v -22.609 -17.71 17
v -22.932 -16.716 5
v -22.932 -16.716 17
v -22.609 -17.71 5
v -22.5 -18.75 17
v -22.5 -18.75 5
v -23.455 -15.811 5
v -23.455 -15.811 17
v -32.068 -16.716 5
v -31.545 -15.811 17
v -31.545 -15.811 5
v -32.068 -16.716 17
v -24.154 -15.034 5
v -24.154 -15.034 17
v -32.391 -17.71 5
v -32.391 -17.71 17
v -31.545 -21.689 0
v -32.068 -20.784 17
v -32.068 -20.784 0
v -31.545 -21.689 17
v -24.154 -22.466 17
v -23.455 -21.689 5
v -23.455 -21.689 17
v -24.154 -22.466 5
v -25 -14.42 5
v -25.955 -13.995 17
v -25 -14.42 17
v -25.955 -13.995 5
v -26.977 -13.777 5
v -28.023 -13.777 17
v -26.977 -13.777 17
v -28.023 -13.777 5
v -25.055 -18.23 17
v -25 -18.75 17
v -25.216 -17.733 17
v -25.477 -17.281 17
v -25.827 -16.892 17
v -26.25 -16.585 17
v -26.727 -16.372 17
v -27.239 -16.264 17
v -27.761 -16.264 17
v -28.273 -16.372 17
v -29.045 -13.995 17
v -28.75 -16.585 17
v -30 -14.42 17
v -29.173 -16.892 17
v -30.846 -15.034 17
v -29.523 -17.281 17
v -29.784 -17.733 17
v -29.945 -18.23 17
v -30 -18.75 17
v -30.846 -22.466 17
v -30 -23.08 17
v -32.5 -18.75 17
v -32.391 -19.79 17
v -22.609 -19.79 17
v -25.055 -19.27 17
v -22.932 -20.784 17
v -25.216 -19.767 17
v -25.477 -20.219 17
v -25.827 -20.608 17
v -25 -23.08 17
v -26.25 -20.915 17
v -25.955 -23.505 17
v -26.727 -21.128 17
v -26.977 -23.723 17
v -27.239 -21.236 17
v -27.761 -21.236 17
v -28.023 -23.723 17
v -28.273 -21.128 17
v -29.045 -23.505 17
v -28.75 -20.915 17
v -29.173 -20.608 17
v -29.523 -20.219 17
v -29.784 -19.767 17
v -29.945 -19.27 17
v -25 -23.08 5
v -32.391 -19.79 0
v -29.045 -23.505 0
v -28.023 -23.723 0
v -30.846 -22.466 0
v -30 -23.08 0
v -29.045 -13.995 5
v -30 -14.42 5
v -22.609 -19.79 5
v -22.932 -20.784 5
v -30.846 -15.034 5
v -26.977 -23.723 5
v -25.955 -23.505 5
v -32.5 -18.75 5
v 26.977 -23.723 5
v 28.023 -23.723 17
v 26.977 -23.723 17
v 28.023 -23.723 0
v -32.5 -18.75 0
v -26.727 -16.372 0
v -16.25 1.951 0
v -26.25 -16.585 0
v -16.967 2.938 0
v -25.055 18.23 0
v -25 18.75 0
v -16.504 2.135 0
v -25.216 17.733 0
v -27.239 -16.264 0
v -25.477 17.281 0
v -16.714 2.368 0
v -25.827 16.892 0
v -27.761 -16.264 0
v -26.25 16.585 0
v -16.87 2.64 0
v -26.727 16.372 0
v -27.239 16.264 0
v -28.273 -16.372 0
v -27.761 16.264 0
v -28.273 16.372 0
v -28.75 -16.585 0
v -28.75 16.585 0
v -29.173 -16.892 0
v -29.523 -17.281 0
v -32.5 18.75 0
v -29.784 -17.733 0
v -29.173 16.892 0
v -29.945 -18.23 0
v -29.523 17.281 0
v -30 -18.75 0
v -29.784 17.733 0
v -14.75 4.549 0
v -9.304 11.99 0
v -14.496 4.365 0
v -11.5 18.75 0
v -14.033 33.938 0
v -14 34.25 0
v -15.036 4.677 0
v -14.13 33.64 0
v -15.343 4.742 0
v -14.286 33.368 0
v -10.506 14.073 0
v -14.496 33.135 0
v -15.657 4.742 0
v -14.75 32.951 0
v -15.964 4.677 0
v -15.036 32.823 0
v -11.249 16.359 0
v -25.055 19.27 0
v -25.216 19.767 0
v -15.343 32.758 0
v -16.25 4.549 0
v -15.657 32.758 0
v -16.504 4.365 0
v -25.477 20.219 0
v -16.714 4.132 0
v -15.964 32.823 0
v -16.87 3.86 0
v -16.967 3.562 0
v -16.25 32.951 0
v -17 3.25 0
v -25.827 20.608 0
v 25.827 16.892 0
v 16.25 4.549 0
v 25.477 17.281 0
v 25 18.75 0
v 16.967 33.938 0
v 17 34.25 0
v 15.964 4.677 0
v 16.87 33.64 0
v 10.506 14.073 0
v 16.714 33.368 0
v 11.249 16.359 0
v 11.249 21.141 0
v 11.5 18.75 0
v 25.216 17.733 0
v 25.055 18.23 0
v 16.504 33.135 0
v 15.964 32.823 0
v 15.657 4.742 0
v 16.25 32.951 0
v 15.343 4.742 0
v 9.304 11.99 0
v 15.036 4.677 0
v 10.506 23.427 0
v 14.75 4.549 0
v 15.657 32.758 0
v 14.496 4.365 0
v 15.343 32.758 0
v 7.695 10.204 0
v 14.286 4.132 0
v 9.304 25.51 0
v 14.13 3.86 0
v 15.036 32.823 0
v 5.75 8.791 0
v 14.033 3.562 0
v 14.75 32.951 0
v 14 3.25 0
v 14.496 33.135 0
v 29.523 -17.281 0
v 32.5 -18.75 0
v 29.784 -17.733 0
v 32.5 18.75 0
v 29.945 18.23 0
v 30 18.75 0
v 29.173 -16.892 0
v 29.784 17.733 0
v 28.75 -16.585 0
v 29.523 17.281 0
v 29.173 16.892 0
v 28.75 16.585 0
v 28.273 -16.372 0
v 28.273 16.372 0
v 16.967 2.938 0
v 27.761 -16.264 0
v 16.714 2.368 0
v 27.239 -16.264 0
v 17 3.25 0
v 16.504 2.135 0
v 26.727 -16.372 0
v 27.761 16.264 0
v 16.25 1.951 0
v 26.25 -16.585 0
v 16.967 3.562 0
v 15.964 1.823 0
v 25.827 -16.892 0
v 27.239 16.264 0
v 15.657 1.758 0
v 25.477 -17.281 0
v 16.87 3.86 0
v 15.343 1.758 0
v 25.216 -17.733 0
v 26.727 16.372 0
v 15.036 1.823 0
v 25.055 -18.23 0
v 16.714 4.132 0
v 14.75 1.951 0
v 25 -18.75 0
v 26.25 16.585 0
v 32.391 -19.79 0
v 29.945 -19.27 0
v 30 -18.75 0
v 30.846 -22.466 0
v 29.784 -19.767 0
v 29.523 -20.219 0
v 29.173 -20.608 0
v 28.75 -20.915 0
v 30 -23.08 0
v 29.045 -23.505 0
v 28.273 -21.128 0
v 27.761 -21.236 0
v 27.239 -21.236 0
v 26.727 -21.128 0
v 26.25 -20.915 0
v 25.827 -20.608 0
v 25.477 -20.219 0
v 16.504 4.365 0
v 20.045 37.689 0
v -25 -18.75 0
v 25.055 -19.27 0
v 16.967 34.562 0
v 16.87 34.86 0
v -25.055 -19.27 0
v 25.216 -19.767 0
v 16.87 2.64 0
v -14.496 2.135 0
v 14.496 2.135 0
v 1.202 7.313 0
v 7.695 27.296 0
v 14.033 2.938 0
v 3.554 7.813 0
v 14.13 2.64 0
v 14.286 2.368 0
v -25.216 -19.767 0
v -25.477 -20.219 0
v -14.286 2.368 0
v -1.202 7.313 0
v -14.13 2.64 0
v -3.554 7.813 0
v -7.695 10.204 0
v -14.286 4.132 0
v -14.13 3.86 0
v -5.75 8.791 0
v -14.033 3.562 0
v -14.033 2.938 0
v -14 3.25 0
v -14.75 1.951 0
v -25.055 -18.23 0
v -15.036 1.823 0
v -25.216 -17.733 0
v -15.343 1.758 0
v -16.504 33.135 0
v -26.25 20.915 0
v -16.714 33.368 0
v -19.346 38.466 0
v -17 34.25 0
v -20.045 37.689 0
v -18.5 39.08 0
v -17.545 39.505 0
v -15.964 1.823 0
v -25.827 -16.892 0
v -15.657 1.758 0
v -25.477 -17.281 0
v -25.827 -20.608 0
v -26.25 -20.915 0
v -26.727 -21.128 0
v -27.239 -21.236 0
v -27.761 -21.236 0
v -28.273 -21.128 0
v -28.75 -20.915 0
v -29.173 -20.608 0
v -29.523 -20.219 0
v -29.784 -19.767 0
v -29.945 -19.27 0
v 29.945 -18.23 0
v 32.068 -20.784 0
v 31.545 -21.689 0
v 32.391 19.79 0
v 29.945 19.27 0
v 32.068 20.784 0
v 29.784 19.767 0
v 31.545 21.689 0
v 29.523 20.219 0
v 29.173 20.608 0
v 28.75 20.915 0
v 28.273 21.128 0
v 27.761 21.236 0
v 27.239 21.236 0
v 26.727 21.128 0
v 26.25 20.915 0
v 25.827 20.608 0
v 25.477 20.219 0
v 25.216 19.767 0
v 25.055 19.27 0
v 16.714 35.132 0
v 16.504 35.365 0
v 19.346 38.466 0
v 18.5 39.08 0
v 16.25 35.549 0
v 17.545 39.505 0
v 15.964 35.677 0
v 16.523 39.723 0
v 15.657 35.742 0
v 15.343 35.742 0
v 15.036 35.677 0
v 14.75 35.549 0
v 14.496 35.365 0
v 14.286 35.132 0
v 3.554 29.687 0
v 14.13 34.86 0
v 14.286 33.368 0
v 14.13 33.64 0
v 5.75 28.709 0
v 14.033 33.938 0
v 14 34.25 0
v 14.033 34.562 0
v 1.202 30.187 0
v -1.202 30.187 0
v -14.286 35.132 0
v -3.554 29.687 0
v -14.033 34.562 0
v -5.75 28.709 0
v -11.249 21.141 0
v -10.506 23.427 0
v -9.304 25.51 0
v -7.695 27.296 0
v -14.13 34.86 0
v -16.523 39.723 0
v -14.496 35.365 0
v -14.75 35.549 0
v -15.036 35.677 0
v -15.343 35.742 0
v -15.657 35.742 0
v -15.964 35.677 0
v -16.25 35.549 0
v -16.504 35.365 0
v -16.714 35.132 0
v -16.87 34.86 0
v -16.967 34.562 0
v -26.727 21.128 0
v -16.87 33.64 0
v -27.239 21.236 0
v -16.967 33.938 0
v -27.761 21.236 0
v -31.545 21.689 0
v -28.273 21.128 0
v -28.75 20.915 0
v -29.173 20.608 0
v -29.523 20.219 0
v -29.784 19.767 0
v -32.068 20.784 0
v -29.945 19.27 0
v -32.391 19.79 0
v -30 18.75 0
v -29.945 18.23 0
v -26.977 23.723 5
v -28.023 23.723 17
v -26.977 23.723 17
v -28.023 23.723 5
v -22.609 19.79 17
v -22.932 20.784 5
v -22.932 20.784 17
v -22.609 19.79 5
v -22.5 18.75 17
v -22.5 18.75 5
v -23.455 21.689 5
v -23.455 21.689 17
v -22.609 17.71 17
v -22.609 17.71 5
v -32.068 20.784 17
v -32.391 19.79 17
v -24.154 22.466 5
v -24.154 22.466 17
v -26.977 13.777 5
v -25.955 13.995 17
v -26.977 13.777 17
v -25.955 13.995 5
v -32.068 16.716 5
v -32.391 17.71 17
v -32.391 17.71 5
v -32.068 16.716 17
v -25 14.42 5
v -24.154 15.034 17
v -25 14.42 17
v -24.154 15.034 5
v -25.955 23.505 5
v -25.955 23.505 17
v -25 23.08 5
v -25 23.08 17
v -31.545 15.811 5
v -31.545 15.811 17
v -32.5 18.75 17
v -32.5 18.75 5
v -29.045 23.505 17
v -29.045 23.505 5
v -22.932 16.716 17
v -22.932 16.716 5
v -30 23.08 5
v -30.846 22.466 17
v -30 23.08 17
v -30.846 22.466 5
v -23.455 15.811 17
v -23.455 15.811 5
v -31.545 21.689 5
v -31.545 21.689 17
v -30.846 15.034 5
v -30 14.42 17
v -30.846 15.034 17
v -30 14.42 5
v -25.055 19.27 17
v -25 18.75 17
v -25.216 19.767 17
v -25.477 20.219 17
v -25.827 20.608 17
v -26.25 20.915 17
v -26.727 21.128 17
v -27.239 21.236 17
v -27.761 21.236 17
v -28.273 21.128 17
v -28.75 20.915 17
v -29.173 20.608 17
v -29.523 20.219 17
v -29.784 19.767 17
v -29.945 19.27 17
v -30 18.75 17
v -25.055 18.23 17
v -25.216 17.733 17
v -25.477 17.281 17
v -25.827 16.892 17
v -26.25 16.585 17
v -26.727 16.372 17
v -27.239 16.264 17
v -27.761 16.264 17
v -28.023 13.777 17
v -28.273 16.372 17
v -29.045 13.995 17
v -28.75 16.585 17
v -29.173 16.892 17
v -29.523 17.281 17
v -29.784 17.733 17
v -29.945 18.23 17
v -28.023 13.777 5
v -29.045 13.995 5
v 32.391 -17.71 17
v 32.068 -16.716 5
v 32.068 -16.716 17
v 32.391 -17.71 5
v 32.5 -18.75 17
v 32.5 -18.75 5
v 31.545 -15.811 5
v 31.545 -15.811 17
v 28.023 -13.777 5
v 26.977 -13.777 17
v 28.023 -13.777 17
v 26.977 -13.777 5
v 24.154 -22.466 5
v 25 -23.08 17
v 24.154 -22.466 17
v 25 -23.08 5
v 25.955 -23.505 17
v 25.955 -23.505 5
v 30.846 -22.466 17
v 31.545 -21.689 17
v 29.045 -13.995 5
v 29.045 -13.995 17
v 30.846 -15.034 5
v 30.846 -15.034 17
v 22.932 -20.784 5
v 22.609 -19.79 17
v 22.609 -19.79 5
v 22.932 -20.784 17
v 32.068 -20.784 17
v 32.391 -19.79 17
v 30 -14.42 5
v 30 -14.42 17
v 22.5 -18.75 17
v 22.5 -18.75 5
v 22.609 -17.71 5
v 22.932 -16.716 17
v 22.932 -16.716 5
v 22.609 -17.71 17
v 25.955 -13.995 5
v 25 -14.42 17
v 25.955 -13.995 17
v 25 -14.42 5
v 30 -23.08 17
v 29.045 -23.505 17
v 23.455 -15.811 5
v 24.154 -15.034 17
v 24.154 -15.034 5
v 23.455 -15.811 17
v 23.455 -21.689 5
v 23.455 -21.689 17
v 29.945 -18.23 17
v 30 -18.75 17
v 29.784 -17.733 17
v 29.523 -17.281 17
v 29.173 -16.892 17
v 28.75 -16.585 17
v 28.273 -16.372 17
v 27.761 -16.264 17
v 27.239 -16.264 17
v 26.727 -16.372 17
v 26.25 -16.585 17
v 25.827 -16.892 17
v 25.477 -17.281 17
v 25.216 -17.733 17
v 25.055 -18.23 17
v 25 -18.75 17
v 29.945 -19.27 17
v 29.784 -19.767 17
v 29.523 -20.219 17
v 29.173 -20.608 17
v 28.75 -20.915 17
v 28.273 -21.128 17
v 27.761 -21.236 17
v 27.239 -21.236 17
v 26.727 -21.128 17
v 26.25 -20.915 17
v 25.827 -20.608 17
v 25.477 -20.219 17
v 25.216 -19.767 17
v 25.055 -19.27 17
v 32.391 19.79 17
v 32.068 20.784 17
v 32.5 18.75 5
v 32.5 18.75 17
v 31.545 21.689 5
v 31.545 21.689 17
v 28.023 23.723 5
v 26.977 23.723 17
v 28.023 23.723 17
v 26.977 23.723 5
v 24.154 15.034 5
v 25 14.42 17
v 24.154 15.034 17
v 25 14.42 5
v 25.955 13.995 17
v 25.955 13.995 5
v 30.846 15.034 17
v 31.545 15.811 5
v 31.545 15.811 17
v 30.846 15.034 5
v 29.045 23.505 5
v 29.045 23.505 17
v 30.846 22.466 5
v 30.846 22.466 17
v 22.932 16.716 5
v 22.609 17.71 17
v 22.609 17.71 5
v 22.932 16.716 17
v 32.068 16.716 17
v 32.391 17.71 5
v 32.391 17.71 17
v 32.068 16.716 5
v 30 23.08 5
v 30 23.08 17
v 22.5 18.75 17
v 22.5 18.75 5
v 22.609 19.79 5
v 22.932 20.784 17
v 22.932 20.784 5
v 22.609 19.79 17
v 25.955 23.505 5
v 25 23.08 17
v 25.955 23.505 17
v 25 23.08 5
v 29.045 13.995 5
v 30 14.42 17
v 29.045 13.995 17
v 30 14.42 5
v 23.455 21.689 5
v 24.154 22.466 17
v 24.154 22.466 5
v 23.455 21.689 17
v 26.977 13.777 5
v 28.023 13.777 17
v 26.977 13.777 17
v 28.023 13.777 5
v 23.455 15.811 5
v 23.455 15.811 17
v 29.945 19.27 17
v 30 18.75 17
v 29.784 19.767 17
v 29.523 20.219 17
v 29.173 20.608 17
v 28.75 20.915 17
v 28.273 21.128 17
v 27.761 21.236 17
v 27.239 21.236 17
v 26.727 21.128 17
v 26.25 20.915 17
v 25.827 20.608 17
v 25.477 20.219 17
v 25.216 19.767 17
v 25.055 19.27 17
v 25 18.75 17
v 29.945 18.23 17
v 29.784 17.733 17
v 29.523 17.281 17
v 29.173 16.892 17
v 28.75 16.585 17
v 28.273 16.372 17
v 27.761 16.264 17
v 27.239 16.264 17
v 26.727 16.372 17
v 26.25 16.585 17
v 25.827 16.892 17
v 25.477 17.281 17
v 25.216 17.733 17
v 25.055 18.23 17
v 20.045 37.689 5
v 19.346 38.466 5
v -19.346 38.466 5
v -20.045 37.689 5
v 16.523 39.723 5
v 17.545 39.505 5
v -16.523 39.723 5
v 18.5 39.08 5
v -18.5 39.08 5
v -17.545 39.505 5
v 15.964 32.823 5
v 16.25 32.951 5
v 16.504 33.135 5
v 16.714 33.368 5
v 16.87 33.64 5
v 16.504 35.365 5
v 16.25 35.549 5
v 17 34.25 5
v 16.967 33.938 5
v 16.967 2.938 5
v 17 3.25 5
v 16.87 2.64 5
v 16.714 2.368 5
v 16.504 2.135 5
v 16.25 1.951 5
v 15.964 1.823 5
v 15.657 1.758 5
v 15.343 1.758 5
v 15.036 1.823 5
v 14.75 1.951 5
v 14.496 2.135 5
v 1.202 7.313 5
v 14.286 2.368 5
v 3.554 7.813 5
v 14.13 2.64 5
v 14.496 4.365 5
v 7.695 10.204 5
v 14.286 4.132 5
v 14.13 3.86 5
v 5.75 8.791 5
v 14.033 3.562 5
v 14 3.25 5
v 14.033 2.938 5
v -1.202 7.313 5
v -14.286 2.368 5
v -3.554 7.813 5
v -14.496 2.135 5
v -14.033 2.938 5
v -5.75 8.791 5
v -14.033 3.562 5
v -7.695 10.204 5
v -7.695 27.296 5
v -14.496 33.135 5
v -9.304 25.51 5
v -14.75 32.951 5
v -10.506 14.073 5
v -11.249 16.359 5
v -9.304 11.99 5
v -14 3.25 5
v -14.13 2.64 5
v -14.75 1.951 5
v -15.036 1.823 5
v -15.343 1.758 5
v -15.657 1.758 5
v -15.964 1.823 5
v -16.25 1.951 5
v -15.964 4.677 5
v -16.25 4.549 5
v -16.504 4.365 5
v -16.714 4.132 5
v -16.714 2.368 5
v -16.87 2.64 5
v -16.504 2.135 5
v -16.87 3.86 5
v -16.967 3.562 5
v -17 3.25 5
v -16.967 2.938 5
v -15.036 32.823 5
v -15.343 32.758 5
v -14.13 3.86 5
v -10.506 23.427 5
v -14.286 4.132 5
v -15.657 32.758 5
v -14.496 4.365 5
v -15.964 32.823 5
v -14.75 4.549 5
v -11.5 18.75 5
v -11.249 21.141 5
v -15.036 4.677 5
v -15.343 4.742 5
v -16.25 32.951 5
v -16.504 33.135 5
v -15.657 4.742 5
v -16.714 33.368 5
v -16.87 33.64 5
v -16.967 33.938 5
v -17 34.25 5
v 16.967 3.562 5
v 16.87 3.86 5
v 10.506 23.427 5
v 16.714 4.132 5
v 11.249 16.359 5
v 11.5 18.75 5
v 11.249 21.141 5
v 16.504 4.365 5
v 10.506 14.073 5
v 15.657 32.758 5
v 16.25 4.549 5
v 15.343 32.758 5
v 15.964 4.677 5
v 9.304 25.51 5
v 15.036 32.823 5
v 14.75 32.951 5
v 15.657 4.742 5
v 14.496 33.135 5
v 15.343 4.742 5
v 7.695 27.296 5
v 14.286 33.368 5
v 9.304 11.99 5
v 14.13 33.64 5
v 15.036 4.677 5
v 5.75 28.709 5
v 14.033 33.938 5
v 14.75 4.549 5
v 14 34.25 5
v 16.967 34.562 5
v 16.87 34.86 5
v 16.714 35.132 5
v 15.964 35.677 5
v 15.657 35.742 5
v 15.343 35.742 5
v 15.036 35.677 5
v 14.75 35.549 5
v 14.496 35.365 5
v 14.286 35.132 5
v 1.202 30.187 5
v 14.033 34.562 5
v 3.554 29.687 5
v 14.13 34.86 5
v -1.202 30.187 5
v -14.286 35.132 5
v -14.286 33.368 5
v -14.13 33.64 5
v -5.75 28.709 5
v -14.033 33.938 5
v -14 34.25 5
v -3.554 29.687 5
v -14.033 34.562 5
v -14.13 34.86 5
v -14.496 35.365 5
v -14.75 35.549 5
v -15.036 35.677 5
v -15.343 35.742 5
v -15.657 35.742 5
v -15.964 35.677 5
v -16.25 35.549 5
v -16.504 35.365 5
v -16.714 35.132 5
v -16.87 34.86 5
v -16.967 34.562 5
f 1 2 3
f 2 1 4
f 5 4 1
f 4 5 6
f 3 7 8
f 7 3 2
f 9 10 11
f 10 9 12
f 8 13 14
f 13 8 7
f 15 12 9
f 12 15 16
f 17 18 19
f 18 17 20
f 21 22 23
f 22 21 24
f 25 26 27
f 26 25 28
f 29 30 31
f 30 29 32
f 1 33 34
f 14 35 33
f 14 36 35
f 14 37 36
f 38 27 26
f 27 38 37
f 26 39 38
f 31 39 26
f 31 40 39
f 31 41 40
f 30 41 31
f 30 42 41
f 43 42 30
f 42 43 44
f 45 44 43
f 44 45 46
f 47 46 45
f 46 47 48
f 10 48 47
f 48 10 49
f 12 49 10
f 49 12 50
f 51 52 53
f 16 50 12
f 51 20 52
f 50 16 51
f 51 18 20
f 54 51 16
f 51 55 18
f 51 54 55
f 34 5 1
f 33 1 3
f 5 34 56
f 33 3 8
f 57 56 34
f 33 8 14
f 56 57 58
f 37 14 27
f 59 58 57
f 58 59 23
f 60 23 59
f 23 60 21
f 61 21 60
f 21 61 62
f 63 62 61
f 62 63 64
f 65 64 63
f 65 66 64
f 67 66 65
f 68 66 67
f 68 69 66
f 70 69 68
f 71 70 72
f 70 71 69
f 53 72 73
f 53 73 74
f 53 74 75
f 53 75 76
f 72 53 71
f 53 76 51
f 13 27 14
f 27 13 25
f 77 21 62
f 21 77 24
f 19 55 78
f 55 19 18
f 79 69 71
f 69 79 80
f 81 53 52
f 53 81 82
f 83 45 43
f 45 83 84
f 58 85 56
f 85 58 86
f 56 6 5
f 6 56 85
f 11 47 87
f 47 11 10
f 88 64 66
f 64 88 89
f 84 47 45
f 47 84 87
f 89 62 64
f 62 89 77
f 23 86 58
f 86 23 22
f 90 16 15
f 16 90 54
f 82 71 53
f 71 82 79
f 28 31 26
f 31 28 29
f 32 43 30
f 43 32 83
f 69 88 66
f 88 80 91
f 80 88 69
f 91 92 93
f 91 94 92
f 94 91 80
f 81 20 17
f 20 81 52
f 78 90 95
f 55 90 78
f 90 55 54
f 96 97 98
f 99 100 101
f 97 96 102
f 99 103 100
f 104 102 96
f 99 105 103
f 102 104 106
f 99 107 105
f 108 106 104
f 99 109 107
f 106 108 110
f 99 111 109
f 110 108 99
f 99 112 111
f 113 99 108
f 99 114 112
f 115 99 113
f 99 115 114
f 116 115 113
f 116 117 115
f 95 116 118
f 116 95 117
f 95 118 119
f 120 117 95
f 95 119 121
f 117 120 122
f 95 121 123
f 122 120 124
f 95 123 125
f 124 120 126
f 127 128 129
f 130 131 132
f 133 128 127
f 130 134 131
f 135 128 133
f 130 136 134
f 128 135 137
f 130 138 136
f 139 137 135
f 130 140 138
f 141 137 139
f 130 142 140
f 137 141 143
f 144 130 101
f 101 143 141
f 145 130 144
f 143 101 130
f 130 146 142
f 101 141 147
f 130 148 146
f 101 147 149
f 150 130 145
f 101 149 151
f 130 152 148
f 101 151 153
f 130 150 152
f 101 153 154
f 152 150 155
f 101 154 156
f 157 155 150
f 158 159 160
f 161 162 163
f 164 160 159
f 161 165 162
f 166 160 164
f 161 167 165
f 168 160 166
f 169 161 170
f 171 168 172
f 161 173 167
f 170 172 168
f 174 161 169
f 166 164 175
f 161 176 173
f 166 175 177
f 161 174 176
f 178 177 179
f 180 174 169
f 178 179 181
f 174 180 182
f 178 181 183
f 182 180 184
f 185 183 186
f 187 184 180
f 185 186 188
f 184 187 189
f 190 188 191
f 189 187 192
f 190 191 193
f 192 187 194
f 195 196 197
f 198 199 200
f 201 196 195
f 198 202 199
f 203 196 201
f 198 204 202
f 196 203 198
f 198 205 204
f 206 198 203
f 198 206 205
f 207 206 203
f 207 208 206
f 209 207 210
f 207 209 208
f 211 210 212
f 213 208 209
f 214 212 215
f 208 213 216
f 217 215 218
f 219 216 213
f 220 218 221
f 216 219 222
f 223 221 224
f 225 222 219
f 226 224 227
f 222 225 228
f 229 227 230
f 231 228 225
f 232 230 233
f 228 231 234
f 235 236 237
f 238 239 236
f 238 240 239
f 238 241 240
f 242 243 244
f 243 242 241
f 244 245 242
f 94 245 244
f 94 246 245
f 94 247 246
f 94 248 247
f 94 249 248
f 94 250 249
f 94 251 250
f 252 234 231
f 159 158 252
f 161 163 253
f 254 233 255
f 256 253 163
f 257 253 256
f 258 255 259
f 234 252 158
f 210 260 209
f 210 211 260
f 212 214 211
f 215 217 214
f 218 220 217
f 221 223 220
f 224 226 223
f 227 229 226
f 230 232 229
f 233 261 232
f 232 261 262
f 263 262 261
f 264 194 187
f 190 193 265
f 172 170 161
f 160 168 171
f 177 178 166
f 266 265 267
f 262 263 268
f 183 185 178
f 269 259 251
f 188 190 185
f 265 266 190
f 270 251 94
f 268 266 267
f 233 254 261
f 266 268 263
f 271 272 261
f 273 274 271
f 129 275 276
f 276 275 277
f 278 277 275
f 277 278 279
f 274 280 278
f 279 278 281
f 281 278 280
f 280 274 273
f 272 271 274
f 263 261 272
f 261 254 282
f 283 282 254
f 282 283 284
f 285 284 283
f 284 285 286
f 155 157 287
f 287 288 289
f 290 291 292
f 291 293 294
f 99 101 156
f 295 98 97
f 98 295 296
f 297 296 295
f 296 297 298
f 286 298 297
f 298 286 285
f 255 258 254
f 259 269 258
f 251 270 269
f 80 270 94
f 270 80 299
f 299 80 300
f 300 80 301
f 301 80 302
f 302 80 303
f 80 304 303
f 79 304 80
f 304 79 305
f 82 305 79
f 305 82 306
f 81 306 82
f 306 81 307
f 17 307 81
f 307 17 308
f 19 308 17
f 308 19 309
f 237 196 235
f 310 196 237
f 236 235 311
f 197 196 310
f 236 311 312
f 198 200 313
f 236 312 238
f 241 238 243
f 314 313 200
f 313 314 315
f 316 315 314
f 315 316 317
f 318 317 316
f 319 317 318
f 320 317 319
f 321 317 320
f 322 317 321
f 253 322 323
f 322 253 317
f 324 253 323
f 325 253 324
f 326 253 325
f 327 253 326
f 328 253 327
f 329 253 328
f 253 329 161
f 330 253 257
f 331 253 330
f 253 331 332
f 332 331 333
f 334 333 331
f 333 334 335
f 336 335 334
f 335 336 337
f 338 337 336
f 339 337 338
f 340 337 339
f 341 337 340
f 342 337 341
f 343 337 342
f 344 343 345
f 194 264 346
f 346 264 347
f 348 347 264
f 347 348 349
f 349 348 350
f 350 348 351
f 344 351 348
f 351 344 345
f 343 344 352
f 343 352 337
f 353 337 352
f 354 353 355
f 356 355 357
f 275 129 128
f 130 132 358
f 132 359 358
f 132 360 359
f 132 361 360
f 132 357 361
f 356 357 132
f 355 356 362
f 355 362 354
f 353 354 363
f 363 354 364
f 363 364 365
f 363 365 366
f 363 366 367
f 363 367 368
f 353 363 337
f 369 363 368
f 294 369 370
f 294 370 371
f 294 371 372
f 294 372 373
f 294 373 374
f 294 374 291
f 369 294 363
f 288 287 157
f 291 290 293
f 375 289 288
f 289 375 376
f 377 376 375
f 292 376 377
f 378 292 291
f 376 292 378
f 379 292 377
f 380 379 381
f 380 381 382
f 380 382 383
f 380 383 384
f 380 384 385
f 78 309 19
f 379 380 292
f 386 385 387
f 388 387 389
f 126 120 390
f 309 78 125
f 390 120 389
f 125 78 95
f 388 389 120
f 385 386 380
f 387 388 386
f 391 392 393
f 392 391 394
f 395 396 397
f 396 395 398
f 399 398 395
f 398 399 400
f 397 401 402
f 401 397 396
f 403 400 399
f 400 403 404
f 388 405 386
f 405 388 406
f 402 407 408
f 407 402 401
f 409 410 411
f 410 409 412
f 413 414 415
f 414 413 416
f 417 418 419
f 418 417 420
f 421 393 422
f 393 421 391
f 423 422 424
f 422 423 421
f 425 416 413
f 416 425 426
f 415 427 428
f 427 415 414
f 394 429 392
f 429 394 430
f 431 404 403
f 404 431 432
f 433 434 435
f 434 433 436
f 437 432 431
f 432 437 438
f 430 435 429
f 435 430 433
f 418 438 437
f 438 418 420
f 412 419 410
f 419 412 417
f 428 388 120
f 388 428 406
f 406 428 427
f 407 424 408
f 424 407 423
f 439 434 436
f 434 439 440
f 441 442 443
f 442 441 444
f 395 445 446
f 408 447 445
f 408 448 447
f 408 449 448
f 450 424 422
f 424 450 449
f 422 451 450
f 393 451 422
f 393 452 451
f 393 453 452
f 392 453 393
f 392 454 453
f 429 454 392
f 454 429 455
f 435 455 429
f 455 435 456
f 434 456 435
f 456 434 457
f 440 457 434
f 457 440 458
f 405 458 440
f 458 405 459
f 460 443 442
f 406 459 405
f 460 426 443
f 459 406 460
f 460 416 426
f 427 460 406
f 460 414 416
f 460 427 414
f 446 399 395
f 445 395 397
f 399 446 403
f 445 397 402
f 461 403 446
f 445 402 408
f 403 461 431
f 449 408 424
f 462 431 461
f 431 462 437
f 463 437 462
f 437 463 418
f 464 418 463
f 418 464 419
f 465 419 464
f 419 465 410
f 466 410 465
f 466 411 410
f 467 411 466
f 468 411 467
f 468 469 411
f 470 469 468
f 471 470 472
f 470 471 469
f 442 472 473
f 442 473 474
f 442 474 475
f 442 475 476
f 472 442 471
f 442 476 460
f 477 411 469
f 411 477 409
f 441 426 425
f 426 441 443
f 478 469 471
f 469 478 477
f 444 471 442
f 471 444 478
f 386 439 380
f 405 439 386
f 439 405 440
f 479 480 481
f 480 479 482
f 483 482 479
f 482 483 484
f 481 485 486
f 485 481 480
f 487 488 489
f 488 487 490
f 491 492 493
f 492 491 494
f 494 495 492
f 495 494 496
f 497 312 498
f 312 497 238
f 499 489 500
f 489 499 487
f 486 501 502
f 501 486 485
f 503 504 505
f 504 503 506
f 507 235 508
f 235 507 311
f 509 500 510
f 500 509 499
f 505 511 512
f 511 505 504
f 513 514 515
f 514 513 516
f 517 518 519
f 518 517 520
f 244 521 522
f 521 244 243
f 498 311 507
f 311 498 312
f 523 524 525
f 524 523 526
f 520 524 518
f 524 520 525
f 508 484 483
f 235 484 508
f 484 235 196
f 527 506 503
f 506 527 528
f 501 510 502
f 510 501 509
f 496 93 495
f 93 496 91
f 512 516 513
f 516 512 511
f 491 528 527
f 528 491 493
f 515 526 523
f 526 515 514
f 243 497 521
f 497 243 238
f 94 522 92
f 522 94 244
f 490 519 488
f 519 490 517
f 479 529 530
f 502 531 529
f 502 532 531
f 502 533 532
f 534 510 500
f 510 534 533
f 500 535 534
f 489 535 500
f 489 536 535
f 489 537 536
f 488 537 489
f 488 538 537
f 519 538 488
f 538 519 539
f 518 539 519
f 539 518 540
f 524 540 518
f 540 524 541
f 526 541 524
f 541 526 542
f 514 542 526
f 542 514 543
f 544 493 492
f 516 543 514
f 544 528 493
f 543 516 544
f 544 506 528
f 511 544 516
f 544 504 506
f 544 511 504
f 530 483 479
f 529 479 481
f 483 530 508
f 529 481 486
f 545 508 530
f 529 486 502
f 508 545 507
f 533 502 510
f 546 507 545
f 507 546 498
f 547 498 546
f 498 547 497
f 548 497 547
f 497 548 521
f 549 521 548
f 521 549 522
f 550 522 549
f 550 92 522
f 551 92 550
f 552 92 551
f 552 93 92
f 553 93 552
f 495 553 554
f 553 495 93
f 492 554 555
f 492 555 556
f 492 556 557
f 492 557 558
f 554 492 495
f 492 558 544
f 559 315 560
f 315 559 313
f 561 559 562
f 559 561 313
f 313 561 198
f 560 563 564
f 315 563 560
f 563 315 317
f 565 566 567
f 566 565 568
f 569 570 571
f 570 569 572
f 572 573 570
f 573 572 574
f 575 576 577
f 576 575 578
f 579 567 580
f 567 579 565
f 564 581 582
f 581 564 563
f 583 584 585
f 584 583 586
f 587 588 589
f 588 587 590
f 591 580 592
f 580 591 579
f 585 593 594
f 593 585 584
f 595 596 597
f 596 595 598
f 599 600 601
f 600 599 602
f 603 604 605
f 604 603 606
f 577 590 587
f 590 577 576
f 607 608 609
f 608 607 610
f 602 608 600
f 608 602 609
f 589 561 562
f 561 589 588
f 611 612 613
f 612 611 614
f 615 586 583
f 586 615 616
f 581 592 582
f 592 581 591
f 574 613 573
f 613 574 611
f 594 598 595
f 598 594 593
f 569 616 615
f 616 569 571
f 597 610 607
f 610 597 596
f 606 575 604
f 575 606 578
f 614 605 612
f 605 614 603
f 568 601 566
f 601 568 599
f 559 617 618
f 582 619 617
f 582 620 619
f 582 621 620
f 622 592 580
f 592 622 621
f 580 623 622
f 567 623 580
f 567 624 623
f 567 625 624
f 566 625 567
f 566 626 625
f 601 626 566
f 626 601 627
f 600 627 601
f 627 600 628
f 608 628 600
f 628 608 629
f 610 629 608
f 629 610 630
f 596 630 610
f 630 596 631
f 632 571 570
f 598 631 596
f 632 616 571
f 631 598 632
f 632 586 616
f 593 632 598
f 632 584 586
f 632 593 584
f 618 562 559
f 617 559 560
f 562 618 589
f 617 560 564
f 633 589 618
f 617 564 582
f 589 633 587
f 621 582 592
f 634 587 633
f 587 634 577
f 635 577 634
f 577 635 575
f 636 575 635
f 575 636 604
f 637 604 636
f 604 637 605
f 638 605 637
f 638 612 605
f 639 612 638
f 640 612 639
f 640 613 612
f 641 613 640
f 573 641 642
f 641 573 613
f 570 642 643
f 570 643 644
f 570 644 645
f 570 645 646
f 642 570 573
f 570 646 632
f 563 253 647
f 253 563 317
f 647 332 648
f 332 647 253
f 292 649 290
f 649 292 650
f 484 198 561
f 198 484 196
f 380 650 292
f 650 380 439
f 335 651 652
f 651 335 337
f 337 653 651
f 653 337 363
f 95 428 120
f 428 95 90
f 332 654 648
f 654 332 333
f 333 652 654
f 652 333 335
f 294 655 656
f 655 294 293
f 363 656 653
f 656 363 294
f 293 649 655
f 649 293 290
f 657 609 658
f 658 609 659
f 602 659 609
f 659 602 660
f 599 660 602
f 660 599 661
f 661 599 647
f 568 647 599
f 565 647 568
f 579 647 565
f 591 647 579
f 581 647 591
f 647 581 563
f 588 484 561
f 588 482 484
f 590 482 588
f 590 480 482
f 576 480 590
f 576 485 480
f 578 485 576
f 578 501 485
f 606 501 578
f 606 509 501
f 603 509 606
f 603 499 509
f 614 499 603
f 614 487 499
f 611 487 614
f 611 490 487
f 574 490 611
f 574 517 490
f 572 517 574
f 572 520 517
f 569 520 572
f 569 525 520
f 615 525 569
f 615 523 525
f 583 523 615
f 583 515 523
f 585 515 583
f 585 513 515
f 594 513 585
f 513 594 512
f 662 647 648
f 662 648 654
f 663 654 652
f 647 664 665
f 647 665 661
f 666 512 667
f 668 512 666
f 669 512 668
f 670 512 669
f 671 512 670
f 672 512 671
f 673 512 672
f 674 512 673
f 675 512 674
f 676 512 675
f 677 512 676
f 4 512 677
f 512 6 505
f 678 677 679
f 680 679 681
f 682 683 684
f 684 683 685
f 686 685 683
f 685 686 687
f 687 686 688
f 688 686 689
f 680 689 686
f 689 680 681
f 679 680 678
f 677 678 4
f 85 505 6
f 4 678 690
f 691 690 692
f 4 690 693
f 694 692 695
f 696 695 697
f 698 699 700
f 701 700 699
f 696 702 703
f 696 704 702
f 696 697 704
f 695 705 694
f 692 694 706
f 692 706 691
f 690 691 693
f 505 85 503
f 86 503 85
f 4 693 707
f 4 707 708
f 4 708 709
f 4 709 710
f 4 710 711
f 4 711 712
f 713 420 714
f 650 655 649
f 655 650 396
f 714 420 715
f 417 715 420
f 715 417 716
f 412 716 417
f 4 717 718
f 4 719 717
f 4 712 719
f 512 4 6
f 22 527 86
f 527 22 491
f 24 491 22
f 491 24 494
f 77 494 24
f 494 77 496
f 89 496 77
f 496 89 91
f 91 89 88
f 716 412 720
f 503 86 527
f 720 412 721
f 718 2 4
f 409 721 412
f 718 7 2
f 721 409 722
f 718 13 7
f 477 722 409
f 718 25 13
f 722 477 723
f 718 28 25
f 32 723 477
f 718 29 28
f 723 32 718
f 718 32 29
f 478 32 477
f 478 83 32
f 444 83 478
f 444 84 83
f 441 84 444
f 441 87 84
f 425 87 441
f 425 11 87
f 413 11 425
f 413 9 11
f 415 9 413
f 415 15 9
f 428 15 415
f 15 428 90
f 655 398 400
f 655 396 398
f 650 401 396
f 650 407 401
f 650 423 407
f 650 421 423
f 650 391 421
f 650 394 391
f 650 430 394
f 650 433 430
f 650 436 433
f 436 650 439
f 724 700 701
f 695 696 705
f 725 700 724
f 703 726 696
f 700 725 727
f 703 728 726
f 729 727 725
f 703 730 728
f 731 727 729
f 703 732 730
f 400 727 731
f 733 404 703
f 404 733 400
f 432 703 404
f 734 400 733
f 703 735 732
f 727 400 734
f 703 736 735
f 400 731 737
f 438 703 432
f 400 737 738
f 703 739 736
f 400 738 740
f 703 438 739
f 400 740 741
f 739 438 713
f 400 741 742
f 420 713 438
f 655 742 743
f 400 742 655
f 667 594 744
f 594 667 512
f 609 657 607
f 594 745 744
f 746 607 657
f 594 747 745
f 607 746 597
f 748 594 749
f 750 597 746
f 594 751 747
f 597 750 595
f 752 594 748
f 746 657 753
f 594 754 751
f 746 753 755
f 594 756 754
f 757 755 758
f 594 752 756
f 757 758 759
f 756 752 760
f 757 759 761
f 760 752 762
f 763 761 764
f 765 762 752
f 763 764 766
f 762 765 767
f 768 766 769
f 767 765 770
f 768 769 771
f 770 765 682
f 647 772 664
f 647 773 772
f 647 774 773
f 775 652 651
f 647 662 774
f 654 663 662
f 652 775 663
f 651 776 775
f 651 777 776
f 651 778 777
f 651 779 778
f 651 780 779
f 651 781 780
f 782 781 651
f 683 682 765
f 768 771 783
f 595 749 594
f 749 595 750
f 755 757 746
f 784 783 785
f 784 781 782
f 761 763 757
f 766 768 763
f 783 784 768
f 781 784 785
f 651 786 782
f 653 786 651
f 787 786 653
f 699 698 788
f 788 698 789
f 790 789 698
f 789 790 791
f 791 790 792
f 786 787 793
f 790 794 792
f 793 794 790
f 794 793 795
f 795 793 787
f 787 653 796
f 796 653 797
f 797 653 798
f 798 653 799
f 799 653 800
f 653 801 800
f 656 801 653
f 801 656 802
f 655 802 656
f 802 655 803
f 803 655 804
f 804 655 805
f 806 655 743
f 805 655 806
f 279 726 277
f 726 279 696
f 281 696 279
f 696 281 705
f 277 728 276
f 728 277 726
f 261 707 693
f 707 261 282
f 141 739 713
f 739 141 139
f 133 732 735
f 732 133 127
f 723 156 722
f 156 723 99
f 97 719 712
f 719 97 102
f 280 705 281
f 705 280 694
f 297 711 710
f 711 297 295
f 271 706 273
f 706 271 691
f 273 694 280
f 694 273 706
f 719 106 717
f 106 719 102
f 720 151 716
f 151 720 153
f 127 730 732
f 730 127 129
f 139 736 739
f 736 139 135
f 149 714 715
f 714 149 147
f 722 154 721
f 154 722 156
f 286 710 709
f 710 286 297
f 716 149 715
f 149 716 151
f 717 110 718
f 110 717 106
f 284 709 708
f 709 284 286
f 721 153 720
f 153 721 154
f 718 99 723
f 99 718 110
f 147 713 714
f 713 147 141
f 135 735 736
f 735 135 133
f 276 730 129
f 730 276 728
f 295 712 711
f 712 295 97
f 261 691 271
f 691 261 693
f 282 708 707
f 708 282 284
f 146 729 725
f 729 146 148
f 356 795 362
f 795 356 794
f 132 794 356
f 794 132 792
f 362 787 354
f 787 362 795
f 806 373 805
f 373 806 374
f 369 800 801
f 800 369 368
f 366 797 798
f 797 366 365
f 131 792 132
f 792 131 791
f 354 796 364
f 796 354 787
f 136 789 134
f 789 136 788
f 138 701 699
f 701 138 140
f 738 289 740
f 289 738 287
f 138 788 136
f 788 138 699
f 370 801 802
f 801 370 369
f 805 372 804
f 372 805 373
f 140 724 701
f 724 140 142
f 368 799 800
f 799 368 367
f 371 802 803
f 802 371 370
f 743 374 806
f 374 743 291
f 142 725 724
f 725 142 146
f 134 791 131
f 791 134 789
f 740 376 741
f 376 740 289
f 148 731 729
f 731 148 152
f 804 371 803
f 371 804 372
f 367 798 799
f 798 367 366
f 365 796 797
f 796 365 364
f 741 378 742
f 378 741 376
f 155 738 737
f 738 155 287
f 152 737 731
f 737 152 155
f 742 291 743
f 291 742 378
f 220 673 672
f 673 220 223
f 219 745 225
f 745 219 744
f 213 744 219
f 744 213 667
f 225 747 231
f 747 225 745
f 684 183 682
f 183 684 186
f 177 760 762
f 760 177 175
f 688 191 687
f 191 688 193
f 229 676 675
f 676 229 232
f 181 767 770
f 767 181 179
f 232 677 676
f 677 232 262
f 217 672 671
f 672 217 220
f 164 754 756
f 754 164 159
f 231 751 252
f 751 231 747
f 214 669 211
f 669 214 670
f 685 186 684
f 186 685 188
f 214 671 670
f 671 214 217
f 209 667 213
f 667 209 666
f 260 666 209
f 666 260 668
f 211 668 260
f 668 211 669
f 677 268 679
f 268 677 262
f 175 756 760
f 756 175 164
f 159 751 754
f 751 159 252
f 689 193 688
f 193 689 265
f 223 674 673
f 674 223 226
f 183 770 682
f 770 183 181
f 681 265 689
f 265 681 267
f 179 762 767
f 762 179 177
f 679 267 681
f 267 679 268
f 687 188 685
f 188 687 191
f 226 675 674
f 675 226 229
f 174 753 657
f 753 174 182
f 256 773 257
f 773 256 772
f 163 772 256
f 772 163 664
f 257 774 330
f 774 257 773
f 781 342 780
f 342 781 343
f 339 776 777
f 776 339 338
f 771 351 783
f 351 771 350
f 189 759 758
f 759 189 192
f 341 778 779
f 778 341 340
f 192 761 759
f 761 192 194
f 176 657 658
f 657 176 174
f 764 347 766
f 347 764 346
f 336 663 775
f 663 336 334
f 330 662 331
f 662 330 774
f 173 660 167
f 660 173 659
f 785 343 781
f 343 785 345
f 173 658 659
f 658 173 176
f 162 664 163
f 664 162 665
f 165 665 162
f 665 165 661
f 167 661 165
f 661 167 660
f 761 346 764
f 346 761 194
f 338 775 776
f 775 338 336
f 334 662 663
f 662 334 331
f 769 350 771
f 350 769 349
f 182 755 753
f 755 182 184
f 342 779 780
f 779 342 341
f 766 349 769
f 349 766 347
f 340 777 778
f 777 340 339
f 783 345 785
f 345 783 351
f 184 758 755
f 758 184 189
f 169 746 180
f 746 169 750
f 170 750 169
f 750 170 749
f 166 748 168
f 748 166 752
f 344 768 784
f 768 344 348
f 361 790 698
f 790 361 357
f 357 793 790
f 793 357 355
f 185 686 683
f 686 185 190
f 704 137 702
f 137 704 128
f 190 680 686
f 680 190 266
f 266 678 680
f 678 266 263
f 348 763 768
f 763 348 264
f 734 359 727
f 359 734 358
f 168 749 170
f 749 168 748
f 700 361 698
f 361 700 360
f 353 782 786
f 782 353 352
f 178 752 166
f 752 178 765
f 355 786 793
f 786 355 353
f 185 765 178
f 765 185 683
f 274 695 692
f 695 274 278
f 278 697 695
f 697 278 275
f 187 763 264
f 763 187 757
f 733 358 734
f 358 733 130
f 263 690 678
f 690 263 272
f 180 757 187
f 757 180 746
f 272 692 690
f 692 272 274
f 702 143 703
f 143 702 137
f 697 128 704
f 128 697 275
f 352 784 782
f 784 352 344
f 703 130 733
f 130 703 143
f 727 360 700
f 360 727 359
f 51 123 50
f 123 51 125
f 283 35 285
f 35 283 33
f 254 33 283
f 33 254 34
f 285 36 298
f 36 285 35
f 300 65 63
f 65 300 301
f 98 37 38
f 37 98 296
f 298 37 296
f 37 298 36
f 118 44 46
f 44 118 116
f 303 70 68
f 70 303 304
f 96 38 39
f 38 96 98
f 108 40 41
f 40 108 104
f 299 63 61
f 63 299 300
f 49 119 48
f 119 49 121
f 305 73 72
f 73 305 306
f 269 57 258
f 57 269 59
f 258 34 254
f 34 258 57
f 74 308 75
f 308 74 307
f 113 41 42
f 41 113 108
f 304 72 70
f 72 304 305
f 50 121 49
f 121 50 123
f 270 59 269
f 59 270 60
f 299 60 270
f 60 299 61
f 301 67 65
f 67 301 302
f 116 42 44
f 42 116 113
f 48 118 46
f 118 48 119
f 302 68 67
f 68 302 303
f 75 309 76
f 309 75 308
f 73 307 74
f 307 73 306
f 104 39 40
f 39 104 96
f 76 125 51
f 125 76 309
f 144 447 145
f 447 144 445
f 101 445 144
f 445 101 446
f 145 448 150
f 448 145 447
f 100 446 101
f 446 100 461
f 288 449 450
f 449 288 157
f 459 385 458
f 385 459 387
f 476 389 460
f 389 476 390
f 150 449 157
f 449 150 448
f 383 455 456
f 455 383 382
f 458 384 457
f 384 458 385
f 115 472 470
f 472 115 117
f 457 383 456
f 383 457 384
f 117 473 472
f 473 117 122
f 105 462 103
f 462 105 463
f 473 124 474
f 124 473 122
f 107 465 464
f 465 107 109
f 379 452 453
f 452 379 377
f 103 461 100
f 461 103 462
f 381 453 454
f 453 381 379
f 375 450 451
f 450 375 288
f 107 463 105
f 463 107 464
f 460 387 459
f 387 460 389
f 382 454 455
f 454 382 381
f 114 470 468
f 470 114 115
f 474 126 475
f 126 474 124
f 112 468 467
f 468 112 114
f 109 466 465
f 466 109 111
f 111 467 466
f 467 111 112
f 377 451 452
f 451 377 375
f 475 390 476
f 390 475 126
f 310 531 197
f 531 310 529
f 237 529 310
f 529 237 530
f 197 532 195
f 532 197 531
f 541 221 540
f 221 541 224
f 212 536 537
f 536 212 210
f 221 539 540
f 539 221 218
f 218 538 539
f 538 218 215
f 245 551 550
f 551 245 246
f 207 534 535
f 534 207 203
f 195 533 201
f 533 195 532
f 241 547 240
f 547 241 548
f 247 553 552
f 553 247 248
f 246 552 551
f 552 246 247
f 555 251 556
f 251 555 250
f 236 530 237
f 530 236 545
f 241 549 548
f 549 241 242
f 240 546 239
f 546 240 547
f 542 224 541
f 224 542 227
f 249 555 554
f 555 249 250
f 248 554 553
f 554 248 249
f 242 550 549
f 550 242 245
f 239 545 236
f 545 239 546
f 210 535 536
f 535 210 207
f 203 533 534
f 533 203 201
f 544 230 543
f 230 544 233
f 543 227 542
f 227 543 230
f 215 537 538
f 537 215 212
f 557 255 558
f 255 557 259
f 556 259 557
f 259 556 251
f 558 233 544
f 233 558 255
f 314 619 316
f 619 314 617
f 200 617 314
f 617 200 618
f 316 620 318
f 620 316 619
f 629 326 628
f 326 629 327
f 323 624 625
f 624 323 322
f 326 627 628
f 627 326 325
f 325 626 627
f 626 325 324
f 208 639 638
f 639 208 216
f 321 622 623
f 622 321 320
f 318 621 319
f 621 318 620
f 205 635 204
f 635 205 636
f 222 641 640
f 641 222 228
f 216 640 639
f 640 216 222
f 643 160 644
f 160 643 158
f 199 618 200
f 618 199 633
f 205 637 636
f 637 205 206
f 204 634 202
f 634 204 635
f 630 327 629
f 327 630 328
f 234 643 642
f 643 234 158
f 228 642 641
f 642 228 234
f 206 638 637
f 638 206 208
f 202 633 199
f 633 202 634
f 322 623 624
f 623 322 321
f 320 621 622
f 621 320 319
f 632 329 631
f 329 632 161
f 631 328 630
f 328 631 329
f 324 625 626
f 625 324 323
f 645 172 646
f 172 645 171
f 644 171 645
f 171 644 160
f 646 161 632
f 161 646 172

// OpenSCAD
WIDTH = 65;
HEIGHT = 90;
THICKNESS = 5;
CORNER_DIA = 10;

MOTOR_WIDTH = 42;
MOTOR_MOUNT_SPACING = 31;
MOTOR_MOUNT_DIA = 3;
MOTOR_SHAFT_DIA = 23;

PULLEY_MOUNT_WIDTH = 55;
PULLEY_MOUNT_HEIGHT = 37.5;
PULLEY_MOUNT_DIA = 5;
PULLEY_SHAFT_LEN = 12;
PULLEY_SHAFT_DIA = 10;
PULLEY_MOTOR_OFFSET = PULLEY_MOUNT_HEIGHT/2;


$fn = 30;

module rounded_cube(width, height, thickness, corner_dia) {
    hull() {
        for(i = [-1, 1]) {
            for(j = [-1, 1]) {
                translate([i * (width - corner_dia)/2, j * (height - corner_dia)/2, 0])
                cylinder(d = corner_dia, h = thickness);
            }
        }
    }       
}

module plate() {
    h = PULLEY_MOUNT_HEIGHT+PULLEY_SHAFT_DIA;
    hull() {
        rounded_cube(WIDTH, h, THICKNESS, CORNER_DIA);
        translate([0, PULLEY_MOTOR_OFFSET, 0])
        rounded_cube(MOTOR_WIDTH, MOTOR_WIDTH, THICKNESS, CORNER_DIA);
    }   
}

module motor_mount_pos() {
    rounded_cube(MOTOR_WIDTH, MOTOR_WIDTH, THICKNESS, CORNER_DIA);
}

module motor_mount_neg() {
    union() {
        for(i = [-1, 1]) {
            for(j = [-1, 1]) {
                translate([i * MOTOR_MOUNT_SPACING/2, j * MOTOR_MOUNT_SPACING/2, 0])
                cylinder(d = MOTOR_MOUNT_DIA, h = THICKNESS);
            }
        }
        cylinder(d = MOTOR_SHAFT_DIA, h = THICKNESS);
    }
}

module pulley_mount_pos() {
    for(i = [-1, 1]) {
        for(j = [-1, 1]) {
            translate([i * PULLEY_MOUNT_WIDTH/2, j * PULLEY_MOUNT_HEIGHT/2, 0])
            cylinder(d = PULLEY_SHAFT_DIA, h = PULLEY_SHAFT_LEN + THICKNESS);
        }
    }
}

module pulley_mount_neg() {
    for(i = [-1, 1]) {
        for(j = [-1, 1]) {
            translate([i * PULLEY_MOUNT_WIDTH/2, j * PULLEY_MOUNT_HEIGHT/2, 0])
            cylinder(d = PULLEY_MOUNT_DIA, h = PULLEY_SHAFT_LEN + THICKNESS);
        }
    }   
}


difference() {
    union() {
        plate();
        translate([0, PULLEY_MOTOR_OFFSET, 0])
        motor_mount_pos();
        pulley_mount_pos();
    }
    translate([0, PULLEY_MOTOR_OFFSET, 0])
    motor_mount_neg();
    pulley_mount_neg();
}
